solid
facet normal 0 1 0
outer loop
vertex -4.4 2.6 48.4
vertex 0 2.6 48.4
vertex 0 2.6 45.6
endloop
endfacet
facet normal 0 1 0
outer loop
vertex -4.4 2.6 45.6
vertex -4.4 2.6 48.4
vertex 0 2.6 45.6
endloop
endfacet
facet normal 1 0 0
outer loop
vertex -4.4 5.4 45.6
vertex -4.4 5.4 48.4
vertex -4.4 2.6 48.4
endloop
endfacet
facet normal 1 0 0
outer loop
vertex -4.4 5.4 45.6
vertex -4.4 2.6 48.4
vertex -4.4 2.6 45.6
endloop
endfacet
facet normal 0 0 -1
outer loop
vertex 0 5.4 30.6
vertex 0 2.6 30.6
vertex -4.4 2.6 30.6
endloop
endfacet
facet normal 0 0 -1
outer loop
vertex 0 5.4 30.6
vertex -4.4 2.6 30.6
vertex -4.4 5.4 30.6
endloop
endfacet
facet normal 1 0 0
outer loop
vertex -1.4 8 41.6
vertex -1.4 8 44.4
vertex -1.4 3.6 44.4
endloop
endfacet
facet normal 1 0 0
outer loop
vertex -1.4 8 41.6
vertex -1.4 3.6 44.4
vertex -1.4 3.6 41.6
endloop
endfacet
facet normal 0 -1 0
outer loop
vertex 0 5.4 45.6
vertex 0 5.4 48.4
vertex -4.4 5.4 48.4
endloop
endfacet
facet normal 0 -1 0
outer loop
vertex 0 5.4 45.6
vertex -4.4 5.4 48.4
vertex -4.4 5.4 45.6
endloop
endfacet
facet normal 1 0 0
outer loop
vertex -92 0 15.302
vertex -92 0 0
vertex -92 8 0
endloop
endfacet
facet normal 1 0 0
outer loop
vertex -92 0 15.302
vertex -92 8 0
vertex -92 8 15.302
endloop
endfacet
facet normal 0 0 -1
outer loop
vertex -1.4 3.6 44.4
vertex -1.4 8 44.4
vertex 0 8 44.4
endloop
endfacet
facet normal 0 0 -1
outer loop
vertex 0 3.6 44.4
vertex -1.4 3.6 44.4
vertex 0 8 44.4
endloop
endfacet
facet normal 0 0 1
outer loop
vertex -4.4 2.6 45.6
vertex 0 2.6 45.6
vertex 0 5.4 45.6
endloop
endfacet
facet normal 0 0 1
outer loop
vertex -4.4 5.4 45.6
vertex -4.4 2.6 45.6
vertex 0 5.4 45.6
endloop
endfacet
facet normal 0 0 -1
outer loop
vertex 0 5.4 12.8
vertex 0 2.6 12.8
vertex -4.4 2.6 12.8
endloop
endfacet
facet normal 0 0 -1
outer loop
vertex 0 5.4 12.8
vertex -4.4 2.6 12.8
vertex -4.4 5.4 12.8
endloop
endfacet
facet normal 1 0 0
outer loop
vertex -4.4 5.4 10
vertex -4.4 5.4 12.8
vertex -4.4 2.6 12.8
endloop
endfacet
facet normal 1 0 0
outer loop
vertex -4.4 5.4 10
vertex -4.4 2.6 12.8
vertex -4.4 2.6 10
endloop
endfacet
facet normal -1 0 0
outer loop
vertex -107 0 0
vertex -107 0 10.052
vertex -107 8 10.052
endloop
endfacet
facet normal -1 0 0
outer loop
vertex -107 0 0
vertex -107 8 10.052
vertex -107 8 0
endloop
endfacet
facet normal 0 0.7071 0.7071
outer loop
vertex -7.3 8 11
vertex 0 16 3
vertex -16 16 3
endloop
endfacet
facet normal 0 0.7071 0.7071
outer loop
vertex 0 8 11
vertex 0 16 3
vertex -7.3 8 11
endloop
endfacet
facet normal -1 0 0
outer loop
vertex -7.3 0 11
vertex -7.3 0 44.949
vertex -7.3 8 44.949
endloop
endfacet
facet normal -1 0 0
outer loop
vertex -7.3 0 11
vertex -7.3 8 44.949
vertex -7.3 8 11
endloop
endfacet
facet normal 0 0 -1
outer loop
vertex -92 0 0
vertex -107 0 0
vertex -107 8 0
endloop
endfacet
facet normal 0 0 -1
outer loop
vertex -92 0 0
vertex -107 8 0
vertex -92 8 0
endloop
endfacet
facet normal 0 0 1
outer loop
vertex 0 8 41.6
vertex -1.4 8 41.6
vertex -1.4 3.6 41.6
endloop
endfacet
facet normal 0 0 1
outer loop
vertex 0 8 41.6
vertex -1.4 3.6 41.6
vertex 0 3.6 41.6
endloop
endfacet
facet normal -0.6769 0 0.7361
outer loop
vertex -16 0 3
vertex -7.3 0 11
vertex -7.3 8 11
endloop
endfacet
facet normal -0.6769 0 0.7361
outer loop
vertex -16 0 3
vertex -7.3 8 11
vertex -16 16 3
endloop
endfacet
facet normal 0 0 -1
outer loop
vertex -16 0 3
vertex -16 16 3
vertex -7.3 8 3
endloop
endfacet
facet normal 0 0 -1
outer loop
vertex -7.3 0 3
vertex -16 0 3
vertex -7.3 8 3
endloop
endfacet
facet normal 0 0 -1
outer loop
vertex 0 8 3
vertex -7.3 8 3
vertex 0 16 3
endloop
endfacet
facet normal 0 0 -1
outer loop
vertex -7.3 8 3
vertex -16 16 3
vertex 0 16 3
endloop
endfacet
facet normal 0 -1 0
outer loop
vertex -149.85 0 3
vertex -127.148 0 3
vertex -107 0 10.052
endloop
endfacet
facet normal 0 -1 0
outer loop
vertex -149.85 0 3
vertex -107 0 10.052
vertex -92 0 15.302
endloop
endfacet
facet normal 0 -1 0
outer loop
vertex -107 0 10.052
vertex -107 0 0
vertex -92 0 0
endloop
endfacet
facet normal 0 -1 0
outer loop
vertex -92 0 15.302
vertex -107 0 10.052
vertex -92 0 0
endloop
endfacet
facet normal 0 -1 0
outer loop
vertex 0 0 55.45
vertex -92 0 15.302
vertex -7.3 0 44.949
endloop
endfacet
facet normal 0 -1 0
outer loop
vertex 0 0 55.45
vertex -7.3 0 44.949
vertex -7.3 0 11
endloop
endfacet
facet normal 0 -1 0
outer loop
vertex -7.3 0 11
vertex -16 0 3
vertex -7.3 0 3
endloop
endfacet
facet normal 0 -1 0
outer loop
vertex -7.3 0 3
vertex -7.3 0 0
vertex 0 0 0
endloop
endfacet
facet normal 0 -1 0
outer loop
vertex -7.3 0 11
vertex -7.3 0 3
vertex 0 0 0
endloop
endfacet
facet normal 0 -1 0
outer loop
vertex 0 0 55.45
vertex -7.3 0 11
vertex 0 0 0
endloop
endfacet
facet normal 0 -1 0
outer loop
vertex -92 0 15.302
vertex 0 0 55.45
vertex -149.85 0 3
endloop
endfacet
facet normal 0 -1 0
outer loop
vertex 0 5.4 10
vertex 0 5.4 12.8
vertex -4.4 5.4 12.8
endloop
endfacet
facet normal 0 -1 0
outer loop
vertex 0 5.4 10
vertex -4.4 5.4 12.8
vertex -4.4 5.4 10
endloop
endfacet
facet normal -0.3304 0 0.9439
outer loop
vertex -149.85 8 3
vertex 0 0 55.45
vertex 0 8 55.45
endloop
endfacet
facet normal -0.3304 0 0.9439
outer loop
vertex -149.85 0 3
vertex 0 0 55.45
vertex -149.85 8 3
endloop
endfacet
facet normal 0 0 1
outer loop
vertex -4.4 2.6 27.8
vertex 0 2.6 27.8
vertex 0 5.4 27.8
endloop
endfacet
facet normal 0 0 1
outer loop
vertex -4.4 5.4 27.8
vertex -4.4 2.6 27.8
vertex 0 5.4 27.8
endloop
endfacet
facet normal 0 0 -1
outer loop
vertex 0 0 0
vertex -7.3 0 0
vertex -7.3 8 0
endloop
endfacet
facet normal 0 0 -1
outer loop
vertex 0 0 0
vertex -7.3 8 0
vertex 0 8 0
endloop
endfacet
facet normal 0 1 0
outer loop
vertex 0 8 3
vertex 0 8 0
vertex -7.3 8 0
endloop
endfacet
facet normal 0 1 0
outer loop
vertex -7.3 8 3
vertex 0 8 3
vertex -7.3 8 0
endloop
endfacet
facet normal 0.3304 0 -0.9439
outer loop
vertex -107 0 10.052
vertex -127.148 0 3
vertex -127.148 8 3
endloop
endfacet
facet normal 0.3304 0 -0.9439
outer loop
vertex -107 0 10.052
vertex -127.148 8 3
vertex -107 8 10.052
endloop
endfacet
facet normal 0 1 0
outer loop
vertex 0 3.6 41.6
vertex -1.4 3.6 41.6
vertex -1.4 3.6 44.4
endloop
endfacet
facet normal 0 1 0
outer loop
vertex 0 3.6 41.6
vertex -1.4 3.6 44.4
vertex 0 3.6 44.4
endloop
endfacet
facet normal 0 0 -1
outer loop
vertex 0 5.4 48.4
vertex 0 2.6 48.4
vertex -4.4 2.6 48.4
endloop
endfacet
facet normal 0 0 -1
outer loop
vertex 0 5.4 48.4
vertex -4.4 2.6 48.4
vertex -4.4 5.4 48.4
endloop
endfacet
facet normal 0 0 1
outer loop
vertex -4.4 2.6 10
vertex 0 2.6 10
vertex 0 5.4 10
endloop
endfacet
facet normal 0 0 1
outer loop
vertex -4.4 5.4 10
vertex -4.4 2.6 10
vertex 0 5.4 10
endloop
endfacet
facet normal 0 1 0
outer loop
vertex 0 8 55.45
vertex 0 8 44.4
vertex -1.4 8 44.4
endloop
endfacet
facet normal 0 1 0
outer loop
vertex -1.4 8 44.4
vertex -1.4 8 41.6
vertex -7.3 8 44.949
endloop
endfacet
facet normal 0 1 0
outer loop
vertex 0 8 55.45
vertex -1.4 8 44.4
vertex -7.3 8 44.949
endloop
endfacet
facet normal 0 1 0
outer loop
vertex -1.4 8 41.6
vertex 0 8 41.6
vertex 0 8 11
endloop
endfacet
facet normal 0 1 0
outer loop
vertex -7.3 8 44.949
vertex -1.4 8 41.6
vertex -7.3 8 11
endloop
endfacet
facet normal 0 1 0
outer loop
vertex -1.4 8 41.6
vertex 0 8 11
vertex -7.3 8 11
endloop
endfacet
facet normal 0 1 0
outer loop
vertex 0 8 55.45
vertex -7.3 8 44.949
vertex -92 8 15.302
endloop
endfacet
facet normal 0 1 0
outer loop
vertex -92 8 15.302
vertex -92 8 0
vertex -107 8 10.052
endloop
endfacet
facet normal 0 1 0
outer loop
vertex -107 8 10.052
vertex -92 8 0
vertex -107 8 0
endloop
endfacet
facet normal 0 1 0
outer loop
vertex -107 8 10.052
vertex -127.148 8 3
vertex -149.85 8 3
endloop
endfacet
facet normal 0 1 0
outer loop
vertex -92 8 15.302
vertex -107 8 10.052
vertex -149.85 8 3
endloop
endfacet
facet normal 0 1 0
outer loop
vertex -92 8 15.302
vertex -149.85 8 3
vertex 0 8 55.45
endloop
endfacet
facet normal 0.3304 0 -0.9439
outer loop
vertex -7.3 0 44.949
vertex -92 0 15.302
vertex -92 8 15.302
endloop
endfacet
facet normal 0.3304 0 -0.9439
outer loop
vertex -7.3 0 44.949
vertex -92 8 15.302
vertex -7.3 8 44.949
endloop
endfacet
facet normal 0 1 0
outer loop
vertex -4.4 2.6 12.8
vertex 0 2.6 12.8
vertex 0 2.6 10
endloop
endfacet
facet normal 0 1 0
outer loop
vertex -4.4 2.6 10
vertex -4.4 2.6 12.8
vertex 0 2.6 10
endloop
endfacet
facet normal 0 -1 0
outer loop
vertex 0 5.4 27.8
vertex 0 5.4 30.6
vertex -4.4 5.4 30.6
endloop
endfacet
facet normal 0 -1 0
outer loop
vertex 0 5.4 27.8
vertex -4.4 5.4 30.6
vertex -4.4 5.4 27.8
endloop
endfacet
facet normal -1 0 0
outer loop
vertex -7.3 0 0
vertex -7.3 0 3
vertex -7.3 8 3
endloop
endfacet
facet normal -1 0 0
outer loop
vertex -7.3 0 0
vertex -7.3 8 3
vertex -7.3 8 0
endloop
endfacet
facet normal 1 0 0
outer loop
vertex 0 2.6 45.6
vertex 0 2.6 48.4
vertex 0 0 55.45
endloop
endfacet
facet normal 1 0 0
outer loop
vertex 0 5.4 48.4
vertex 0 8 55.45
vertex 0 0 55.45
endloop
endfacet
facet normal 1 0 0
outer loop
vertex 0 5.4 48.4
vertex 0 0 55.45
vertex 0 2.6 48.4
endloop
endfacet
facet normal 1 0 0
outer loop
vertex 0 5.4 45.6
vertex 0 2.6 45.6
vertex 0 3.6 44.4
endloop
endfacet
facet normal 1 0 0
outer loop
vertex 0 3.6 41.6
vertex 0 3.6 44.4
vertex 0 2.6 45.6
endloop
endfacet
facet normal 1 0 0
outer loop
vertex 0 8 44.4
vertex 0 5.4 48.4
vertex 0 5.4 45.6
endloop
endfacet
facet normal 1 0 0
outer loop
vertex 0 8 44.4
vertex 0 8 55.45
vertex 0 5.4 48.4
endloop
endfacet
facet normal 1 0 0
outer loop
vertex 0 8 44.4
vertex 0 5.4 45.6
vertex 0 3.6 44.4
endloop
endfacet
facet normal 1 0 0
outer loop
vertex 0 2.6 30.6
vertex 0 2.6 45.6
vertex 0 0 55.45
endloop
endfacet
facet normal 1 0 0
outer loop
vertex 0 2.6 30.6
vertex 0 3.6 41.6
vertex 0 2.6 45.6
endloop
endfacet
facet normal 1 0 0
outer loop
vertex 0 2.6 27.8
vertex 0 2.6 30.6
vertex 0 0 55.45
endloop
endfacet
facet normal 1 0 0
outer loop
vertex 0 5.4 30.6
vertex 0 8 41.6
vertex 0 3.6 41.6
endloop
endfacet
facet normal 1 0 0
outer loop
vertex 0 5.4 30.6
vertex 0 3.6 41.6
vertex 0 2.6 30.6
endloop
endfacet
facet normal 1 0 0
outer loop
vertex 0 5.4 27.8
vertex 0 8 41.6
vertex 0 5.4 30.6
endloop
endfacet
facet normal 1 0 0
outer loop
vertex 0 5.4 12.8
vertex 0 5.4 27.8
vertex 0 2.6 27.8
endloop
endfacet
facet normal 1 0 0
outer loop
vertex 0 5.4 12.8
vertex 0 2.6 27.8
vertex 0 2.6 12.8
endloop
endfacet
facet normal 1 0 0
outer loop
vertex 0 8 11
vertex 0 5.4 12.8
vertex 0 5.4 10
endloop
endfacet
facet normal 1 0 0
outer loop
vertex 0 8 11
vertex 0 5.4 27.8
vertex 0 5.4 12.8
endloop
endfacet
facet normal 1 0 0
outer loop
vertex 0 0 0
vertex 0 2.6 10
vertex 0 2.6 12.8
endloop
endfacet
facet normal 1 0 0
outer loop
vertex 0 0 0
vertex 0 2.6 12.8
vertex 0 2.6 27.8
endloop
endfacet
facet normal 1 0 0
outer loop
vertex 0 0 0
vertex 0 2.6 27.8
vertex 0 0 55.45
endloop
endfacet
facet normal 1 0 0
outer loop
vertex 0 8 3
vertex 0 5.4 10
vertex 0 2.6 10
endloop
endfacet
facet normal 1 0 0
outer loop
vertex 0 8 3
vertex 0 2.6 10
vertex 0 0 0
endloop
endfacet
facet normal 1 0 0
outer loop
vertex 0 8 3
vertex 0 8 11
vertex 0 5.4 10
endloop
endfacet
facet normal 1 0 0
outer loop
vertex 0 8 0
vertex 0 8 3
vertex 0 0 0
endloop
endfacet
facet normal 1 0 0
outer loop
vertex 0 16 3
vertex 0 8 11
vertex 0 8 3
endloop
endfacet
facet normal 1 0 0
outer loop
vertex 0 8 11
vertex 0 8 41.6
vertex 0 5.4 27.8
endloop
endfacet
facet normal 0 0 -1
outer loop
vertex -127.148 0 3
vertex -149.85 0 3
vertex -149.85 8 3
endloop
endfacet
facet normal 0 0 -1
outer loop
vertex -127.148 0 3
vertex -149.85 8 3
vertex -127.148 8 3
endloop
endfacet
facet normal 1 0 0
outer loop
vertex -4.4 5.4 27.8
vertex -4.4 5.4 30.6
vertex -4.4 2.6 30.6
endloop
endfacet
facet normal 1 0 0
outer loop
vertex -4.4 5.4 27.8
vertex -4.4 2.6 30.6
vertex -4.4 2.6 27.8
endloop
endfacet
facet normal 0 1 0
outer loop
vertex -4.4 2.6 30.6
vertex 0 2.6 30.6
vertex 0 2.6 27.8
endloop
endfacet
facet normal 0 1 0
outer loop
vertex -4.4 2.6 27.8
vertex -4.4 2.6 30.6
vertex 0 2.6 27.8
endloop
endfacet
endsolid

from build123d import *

# Parameters (mm, degrees)
P_IDAT_VYSUNUT_M1_DEPTH  = 8
SKICA3_W                 = 1.4
SKICA3_H                 = 2.8
ODEBRAT_VYSUNUT_M1_DEPTH = 4.4
P_IDAT_START             = 8
SKICA5_W                 = 16
SKICA5_H                 = 8
P_IDAT_VYSUNUT_M2_DEPTH  = 16
ODEBRAT_VYSUNUT_M3_DEPTH = 161.57934176
ODEBRAT_VYSUNUT_M4_DEPTH = 161.57934176
SKICA4_W                 = 2.8
SKICA4_H                 = 2.8
ODEBRAT_VYSUNUT_M2_DEPTH = 4.4


with BuildPart() as part:
    # Skica2 → Přidat vysunutím1 (new body)
    with BuildSketch(Plane(origin=(0, 0, 0), x_dir=(1, 0, 0), z_dir=(0, 1, 0))):
        Polygon((0, 0), (0, -55.45), (-149.85, -3), (-127.147799643, -3), (-107, -10.052066008), (-107, 0), (-92, 0), (-92, -15.302316258), (-7.3, -44.948729338), (-7.3, 0), align=None)
    extrude(amount=P_IDAT_VYSUNUT_M1_DEPTH)

    # Skica3 → Odebrat vysunutím1 (cut)
    with BuildSketch(Plane(origin=(0, 8, 0), x_dir=(1, 0, 0), z_dir=(0, 1, 0))):
        with Locations((-0.7, -43)):
            Rectangle(SKICA3_W, SKICA3_H)
    extrude(amount=-ODEBRAT_VYSUNUT_M1_DEPTH, mode=Mode.SUBTRACT)

    # Skica5 → Přidat vysunutím2 (add)
    with BuildSketch(Plane(origin=(0, 8, 0), x_dir=(1, 0, 0), z_dir=(0, 1, 0)).offset(P_IDAT_START)):
        with Locations((-8, -7)):
            Rectangle(SKICA5_W, SKICA5_H)
    extrude(amount=-P_IDAT_VYSUNUT_M2_DEPTH)

    # Skica6 → Odebrat vysunutím3 (cut, through all)
    with BuildSketch(Plane(origin=(0, 0, 0), x_dir=(0, 0, -1), z_dir=(1, 0, 0))):
        Polygon((-11, 8), (-11, 16), (-3, 16), align=None)
    extrude(amount=-ODEBRAT_VYSUNUT_M3_DEPTH, mode=Mode.SUBTRACT)

    # Skica7 → Odebrat vysunutím4 (cut, through all)
    with BuildSketch(Plane.XZ):
        Polygon((-16, 3), (-16, 11), (-7.3, 11), align=None)
    extrude(amount=-ODEBRAT_VYSUNUT_M4_DEPTH, mode=Mode.SUBTRACT)

    # Skica4 → Odebrat vysunutím2 (cut)
    with BuildSketch(Plane(origin=(0, 0, 0), x_dir=(0, 0, -1), z_dir=(1, 0, 0))):
        with Locations((-47, 4)):
            Rectangle(SKICA4_W, SKICA4_H)
        with Locations((-29.2, 4)):
            Rectangle(SKICA4_W, SKICA4_H)
        with Locations((-11.4, 4)):
            Rectangle(SKICA4_W, SKICA4_H)
    extrude(amount=-ODEBRAT_VYSUNUT_M2_DEPTH, mode=Mode.SUBTRACT)


solid = part.part
